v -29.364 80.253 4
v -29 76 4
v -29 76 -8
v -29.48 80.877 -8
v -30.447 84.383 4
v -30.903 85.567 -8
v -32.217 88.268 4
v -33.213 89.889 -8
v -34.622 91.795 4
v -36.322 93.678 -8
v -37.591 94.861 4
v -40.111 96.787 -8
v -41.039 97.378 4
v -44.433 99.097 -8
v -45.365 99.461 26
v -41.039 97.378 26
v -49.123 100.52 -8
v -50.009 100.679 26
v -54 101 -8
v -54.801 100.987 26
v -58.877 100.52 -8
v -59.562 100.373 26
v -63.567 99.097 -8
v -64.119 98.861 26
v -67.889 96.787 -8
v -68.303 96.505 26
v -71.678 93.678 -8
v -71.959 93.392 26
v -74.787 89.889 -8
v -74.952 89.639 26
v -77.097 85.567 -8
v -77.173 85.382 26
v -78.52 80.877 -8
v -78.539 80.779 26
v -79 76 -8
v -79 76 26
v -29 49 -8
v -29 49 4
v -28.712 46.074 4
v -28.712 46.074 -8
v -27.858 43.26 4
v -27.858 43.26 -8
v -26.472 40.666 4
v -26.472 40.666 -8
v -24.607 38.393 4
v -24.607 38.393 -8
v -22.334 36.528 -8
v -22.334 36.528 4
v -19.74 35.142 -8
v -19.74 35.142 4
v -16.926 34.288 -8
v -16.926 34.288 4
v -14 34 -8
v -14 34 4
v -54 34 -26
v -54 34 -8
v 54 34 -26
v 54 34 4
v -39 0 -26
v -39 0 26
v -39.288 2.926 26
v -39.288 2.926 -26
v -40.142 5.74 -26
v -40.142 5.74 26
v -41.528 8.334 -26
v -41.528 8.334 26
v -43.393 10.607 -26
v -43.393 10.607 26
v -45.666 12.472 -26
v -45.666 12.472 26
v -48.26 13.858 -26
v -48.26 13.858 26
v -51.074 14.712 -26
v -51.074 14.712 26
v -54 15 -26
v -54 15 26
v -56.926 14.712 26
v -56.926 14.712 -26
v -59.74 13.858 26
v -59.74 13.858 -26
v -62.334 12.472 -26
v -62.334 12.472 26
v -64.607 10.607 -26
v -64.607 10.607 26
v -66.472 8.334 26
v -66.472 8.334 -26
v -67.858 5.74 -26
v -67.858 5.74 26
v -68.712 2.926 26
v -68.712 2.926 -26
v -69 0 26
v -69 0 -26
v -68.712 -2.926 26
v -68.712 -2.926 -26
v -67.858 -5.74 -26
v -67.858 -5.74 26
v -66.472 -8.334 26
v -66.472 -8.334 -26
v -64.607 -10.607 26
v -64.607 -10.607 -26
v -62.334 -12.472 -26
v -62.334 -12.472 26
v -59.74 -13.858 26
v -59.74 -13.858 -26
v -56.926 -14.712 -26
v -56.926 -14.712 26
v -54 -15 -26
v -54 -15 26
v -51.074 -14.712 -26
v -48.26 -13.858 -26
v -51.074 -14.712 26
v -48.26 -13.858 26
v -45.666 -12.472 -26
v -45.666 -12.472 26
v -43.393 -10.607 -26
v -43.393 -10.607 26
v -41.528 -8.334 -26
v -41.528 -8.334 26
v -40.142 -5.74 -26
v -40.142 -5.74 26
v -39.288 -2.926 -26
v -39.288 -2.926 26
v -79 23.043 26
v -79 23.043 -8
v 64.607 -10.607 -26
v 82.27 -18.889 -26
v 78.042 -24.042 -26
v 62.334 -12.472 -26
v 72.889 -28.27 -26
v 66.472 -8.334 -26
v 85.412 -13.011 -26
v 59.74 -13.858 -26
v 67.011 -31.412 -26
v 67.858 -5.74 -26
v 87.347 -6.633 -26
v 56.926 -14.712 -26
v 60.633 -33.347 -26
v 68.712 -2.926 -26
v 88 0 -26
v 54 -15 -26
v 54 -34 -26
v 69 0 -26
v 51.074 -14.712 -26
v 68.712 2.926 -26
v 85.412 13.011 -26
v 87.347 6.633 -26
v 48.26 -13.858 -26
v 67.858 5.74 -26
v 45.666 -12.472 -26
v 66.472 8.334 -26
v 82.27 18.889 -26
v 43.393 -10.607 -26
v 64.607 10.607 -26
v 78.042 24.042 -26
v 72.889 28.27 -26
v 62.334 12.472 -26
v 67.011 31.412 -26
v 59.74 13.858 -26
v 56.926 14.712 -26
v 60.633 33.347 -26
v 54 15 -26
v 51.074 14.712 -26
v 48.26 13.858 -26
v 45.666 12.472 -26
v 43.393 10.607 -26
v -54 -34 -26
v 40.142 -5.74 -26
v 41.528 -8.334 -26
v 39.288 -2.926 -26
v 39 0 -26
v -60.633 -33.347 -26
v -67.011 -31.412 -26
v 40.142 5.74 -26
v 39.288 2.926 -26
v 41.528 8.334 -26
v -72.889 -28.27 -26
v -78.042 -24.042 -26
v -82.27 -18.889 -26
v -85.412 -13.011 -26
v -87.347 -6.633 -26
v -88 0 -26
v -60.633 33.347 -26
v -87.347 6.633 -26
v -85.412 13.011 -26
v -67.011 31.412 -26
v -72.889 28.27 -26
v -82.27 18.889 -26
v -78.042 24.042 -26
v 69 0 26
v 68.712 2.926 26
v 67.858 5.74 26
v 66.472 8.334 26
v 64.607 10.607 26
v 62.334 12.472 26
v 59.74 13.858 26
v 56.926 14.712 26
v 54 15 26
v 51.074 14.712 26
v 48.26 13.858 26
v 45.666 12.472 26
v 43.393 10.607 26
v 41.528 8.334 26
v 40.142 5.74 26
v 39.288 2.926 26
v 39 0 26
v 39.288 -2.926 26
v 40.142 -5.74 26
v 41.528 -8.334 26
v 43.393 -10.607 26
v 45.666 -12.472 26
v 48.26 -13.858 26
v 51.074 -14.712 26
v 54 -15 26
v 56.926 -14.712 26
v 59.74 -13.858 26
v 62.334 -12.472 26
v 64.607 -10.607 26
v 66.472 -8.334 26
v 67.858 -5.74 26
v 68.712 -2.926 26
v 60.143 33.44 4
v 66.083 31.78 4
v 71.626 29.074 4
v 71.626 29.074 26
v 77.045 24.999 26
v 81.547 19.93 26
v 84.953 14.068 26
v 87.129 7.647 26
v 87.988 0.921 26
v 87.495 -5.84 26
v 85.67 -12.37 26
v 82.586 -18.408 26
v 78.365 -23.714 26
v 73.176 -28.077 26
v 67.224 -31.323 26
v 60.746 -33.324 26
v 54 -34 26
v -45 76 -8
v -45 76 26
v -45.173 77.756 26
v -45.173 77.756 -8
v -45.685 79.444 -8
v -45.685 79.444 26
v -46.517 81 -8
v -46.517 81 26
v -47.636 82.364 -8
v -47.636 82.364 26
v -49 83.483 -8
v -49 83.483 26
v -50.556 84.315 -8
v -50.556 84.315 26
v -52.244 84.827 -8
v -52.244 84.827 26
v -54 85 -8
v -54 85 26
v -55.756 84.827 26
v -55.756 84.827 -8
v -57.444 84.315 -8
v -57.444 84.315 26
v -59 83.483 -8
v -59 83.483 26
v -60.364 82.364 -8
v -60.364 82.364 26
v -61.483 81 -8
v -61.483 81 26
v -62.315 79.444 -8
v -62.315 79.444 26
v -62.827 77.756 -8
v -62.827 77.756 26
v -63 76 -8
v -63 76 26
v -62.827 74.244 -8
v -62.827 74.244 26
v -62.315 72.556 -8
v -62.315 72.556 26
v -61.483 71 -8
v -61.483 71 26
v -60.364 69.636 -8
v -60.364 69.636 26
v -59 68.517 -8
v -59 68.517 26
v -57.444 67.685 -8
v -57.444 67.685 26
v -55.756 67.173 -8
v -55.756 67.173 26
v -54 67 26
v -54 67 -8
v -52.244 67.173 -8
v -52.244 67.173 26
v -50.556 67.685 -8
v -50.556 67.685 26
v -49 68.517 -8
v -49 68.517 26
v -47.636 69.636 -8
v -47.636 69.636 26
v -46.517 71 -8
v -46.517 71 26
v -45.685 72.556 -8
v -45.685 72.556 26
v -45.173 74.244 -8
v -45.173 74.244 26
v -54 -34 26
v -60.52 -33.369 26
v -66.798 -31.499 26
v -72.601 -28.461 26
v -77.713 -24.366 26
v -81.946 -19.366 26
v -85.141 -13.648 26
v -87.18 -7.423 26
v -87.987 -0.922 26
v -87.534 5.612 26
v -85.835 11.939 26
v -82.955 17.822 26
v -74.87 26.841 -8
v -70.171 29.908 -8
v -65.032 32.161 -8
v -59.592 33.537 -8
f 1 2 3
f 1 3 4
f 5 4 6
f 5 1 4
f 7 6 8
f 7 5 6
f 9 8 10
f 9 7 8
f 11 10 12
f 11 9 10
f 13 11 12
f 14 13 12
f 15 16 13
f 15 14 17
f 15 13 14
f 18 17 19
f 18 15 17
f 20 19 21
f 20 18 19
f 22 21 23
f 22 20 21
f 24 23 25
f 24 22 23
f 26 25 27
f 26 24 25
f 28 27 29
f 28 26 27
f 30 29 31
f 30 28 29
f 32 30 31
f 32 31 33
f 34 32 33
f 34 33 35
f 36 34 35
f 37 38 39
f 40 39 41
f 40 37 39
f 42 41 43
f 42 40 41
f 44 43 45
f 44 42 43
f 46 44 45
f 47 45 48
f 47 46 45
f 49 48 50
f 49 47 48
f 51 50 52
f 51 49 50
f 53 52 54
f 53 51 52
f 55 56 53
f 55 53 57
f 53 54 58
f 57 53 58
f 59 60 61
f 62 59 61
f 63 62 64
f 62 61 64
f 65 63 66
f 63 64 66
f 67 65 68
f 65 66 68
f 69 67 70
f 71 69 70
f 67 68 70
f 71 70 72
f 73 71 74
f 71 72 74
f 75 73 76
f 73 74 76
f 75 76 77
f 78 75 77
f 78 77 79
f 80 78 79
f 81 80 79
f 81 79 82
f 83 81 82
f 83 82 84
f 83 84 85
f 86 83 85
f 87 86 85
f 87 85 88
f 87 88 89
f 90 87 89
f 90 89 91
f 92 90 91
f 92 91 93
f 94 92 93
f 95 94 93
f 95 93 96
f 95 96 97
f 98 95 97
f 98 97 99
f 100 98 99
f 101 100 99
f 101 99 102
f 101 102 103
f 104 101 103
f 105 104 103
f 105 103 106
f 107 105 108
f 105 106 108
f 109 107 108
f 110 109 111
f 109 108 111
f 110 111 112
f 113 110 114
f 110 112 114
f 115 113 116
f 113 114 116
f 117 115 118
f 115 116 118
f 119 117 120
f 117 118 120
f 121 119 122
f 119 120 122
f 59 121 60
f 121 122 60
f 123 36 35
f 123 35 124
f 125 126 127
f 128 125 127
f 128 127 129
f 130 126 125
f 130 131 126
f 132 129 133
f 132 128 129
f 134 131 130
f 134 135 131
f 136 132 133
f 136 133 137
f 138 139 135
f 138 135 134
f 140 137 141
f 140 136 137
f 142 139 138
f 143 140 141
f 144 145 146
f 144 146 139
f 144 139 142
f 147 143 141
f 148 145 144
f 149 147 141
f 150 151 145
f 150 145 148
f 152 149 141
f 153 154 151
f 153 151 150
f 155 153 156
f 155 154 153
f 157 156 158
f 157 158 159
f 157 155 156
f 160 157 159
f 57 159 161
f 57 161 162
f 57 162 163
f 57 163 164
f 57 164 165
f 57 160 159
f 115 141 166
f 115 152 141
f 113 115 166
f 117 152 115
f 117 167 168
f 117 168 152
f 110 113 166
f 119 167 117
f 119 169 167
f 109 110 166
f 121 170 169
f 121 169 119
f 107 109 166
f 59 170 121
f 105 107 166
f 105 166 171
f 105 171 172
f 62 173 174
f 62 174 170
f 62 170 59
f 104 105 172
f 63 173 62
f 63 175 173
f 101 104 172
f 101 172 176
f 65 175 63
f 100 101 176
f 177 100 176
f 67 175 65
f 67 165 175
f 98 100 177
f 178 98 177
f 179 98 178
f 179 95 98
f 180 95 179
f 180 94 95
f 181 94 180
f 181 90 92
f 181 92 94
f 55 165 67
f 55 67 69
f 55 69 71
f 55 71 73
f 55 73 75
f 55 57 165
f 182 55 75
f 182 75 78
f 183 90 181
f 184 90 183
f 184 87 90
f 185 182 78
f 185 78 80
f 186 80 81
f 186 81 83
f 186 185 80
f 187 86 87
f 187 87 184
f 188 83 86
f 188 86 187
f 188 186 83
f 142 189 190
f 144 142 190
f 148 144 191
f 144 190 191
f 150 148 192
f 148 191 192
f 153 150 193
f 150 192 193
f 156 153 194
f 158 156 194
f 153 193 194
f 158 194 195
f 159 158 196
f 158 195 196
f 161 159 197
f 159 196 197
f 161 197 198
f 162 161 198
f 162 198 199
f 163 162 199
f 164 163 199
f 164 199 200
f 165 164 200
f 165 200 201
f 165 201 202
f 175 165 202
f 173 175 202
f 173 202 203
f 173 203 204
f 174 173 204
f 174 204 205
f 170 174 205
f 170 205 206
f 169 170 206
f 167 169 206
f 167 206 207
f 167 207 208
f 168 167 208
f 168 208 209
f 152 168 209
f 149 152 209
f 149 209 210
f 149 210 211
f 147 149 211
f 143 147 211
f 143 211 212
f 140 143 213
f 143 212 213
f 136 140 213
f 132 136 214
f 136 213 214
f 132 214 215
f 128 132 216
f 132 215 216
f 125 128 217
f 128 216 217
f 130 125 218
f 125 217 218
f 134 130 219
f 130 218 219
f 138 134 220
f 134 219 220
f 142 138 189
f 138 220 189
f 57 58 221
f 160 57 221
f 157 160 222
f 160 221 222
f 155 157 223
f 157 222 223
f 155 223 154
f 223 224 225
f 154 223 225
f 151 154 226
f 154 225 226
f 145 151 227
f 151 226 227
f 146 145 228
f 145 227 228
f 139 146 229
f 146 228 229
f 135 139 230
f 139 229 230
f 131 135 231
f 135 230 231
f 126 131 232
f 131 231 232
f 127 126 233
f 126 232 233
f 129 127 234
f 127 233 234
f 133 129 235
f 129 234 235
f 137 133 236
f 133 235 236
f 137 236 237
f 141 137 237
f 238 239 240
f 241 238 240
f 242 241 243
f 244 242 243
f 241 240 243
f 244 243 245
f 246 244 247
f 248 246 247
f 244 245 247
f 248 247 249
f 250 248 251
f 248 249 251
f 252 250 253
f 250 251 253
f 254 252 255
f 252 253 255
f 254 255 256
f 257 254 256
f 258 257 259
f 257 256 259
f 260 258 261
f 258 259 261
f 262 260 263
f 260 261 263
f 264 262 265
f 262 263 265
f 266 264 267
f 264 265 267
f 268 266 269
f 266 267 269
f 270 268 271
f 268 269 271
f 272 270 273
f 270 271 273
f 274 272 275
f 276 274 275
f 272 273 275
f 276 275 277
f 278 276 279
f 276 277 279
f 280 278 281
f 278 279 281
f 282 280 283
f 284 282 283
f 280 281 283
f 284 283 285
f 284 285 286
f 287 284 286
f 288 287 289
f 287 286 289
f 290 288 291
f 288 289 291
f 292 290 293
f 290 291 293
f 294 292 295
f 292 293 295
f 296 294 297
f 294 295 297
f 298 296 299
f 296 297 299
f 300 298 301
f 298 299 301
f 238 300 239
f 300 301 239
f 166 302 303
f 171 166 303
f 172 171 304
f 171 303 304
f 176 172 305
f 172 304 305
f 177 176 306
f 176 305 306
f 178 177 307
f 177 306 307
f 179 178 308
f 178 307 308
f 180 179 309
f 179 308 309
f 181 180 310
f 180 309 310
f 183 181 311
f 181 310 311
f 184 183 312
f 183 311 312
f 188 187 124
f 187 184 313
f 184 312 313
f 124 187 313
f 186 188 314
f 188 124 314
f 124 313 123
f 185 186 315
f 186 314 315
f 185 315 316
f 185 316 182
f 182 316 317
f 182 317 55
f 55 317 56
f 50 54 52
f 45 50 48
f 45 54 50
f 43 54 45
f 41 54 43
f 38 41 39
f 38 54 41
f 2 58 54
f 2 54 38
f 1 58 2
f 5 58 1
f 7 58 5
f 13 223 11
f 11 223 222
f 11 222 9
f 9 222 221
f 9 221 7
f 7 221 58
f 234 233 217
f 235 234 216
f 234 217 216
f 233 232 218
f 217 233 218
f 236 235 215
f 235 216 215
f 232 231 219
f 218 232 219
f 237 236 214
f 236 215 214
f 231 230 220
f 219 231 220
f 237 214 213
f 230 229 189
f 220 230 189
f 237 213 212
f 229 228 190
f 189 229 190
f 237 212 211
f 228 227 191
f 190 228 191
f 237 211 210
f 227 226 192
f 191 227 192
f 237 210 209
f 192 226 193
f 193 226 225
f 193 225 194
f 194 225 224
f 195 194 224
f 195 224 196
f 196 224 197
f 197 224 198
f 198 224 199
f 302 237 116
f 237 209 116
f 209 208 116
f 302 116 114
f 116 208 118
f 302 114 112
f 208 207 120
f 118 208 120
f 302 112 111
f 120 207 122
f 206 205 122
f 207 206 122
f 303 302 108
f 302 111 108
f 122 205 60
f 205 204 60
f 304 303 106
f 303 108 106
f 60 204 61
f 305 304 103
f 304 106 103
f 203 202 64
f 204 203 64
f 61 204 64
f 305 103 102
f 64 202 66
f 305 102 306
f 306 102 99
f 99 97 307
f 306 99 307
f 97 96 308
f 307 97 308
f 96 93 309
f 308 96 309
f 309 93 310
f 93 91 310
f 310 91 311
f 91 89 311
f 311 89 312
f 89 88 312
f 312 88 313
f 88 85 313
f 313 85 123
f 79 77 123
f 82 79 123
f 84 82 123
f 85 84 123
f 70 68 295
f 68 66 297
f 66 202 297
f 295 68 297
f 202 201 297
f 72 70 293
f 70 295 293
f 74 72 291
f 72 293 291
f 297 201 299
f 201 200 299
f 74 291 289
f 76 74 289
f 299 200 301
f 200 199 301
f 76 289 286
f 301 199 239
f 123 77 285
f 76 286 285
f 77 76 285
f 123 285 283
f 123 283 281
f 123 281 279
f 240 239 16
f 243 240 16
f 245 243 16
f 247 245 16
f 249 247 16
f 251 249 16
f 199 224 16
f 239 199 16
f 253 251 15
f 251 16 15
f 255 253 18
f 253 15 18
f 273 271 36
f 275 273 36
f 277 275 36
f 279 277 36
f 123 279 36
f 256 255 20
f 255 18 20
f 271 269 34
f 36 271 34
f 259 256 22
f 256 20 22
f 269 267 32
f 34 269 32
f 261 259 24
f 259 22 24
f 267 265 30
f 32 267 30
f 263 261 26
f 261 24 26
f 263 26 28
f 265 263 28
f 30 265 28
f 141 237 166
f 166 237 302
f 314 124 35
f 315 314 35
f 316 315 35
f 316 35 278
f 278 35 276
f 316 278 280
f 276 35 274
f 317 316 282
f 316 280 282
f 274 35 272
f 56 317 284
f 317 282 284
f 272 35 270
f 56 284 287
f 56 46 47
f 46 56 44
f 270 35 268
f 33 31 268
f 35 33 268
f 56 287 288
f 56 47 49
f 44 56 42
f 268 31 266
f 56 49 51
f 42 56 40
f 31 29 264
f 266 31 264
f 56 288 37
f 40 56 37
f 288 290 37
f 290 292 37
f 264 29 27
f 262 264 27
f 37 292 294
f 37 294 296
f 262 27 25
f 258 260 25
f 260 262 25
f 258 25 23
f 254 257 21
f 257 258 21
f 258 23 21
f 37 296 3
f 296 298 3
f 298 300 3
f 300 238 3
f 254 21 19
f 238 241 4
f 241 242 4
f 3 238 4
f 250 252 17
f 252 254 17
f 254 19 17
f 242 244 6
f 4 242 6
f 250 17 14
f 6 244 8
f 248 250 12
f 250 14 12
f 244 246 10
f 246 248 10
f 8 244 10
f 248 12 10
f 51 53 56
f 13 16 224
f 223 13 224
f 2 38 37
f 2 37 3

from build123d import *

# Parameters (mm, degrees)
BOSS_EXTRUDE1_DEPTH = 26
SKETCH2_R           = 15
CUT_EXTRUDE1_DEPTH  = 108.721864076
SKETCH3_R           = 25
SKETCH3_R_2         = 9
BOSS_EXTRUDE2_DEPTH = 34
BOSS_EXTRUDE3_DEPTH = 34
FILLET1_R           = 15
BOSS_EXTRUDE4_DEPTH = 22


with BuildPart() as part:
    # Sketch1 → Boss-Extrude1 (new, symmetric)
    with BuildSketch(Plane.XY):
        with BuildLine():
            Line((-54, 34), (54, 34))
            ThreePointArc((54, 34), (88, 0), (54, -34))
            Line((54, -34), (-54, -34))
            ThreePointArc((-54, -34), (-88, 0), (-54, 34))
        make_face()
    extrude(amount=BOSS_EXTRUDE1_DEPTH, both=True)

    # Sketch2 → Cut-Extrude1 (cut, through all)
    with BuildSketch(Plane.XY.offset(26)):
        with Locations((54, 0)):
            Circle(SKETCH2_R)
        with Locations((-54, 0)):
            Circle(SKETCH2_R)
    extrude(amount=-CUT_EXTRUDE1_DEPTH, mode=Mode.SUBTRACT)



with BuildPart() as body_2:
    # Sketch3 → Boss-Extrude2 (new body)
    with BuildSketch(Plane.XY.offset(26)):
        with Locations((-54, 76)):
            Circle(SKETCH3_R)
        with Locations((-54, 76)):
            Circle(SKETCH3_R_2, mode=Mode.SUBTRACT)
    extrude(amount=-BOSS_EXTRUDE2_DEPTH)


with BuildPart() as part_1:
    add(part.part)

    add(body_2.part)  # Boss-Extrude3 merges body 2
    # Sketch4 → Boss-Extrude3 (add)
    with BuildSketch(Plane.XY.offset(26)):
        with BuildLine():
            Line((-79, 76), (-79, 23.043437244))
            ThreePointArc((-79, 23.043437244), (-67.647767834, 31.140623519), (-54, 34))
            Line((-54, 34), (-29, 34))
            Line((-29, 34), (-29, 76))
            ThreePointArc((-29, 76), (-54, 51), (-79, 76))
        make_face()
    extrude(amount=-BOSS_EXTRUDE3_DEPTH)

    # Fillet1
    fillet1_edges = [part_1.edges().sort_by_distance(p)[0] for p in [
        (-29, 34, 9),
    ]]
    fillet(fillet1_edges, radius=FILLET1_R)

    # Sketch5 → Boss-Extrude4 (add)
    with BuildSketch(Plane.XY.offset(26)):
        with BuildLine():
            Line((-41.03946331, 97.378131086), (71.626329898, 29.074258276))
            ThreePointArc((71.626329898, 29.074258276), (63.150825608, 32.745417858), (54, 34))
            Line((54, 34), (-14, 34))
            ThreePointArc((-14, 34), (-24.606601718, 38.393398282), (-29, 49))
            Line((-29, 49), (-29, 76))
            ThreePointArc((-29, 76), (-32.216825102, 88.26757072), (-41.03946331, 97.378131086))
        make_face()
    extrude(amount=-BOSS_EXTRUDE4_DEPTH)


solid = part_1.part
